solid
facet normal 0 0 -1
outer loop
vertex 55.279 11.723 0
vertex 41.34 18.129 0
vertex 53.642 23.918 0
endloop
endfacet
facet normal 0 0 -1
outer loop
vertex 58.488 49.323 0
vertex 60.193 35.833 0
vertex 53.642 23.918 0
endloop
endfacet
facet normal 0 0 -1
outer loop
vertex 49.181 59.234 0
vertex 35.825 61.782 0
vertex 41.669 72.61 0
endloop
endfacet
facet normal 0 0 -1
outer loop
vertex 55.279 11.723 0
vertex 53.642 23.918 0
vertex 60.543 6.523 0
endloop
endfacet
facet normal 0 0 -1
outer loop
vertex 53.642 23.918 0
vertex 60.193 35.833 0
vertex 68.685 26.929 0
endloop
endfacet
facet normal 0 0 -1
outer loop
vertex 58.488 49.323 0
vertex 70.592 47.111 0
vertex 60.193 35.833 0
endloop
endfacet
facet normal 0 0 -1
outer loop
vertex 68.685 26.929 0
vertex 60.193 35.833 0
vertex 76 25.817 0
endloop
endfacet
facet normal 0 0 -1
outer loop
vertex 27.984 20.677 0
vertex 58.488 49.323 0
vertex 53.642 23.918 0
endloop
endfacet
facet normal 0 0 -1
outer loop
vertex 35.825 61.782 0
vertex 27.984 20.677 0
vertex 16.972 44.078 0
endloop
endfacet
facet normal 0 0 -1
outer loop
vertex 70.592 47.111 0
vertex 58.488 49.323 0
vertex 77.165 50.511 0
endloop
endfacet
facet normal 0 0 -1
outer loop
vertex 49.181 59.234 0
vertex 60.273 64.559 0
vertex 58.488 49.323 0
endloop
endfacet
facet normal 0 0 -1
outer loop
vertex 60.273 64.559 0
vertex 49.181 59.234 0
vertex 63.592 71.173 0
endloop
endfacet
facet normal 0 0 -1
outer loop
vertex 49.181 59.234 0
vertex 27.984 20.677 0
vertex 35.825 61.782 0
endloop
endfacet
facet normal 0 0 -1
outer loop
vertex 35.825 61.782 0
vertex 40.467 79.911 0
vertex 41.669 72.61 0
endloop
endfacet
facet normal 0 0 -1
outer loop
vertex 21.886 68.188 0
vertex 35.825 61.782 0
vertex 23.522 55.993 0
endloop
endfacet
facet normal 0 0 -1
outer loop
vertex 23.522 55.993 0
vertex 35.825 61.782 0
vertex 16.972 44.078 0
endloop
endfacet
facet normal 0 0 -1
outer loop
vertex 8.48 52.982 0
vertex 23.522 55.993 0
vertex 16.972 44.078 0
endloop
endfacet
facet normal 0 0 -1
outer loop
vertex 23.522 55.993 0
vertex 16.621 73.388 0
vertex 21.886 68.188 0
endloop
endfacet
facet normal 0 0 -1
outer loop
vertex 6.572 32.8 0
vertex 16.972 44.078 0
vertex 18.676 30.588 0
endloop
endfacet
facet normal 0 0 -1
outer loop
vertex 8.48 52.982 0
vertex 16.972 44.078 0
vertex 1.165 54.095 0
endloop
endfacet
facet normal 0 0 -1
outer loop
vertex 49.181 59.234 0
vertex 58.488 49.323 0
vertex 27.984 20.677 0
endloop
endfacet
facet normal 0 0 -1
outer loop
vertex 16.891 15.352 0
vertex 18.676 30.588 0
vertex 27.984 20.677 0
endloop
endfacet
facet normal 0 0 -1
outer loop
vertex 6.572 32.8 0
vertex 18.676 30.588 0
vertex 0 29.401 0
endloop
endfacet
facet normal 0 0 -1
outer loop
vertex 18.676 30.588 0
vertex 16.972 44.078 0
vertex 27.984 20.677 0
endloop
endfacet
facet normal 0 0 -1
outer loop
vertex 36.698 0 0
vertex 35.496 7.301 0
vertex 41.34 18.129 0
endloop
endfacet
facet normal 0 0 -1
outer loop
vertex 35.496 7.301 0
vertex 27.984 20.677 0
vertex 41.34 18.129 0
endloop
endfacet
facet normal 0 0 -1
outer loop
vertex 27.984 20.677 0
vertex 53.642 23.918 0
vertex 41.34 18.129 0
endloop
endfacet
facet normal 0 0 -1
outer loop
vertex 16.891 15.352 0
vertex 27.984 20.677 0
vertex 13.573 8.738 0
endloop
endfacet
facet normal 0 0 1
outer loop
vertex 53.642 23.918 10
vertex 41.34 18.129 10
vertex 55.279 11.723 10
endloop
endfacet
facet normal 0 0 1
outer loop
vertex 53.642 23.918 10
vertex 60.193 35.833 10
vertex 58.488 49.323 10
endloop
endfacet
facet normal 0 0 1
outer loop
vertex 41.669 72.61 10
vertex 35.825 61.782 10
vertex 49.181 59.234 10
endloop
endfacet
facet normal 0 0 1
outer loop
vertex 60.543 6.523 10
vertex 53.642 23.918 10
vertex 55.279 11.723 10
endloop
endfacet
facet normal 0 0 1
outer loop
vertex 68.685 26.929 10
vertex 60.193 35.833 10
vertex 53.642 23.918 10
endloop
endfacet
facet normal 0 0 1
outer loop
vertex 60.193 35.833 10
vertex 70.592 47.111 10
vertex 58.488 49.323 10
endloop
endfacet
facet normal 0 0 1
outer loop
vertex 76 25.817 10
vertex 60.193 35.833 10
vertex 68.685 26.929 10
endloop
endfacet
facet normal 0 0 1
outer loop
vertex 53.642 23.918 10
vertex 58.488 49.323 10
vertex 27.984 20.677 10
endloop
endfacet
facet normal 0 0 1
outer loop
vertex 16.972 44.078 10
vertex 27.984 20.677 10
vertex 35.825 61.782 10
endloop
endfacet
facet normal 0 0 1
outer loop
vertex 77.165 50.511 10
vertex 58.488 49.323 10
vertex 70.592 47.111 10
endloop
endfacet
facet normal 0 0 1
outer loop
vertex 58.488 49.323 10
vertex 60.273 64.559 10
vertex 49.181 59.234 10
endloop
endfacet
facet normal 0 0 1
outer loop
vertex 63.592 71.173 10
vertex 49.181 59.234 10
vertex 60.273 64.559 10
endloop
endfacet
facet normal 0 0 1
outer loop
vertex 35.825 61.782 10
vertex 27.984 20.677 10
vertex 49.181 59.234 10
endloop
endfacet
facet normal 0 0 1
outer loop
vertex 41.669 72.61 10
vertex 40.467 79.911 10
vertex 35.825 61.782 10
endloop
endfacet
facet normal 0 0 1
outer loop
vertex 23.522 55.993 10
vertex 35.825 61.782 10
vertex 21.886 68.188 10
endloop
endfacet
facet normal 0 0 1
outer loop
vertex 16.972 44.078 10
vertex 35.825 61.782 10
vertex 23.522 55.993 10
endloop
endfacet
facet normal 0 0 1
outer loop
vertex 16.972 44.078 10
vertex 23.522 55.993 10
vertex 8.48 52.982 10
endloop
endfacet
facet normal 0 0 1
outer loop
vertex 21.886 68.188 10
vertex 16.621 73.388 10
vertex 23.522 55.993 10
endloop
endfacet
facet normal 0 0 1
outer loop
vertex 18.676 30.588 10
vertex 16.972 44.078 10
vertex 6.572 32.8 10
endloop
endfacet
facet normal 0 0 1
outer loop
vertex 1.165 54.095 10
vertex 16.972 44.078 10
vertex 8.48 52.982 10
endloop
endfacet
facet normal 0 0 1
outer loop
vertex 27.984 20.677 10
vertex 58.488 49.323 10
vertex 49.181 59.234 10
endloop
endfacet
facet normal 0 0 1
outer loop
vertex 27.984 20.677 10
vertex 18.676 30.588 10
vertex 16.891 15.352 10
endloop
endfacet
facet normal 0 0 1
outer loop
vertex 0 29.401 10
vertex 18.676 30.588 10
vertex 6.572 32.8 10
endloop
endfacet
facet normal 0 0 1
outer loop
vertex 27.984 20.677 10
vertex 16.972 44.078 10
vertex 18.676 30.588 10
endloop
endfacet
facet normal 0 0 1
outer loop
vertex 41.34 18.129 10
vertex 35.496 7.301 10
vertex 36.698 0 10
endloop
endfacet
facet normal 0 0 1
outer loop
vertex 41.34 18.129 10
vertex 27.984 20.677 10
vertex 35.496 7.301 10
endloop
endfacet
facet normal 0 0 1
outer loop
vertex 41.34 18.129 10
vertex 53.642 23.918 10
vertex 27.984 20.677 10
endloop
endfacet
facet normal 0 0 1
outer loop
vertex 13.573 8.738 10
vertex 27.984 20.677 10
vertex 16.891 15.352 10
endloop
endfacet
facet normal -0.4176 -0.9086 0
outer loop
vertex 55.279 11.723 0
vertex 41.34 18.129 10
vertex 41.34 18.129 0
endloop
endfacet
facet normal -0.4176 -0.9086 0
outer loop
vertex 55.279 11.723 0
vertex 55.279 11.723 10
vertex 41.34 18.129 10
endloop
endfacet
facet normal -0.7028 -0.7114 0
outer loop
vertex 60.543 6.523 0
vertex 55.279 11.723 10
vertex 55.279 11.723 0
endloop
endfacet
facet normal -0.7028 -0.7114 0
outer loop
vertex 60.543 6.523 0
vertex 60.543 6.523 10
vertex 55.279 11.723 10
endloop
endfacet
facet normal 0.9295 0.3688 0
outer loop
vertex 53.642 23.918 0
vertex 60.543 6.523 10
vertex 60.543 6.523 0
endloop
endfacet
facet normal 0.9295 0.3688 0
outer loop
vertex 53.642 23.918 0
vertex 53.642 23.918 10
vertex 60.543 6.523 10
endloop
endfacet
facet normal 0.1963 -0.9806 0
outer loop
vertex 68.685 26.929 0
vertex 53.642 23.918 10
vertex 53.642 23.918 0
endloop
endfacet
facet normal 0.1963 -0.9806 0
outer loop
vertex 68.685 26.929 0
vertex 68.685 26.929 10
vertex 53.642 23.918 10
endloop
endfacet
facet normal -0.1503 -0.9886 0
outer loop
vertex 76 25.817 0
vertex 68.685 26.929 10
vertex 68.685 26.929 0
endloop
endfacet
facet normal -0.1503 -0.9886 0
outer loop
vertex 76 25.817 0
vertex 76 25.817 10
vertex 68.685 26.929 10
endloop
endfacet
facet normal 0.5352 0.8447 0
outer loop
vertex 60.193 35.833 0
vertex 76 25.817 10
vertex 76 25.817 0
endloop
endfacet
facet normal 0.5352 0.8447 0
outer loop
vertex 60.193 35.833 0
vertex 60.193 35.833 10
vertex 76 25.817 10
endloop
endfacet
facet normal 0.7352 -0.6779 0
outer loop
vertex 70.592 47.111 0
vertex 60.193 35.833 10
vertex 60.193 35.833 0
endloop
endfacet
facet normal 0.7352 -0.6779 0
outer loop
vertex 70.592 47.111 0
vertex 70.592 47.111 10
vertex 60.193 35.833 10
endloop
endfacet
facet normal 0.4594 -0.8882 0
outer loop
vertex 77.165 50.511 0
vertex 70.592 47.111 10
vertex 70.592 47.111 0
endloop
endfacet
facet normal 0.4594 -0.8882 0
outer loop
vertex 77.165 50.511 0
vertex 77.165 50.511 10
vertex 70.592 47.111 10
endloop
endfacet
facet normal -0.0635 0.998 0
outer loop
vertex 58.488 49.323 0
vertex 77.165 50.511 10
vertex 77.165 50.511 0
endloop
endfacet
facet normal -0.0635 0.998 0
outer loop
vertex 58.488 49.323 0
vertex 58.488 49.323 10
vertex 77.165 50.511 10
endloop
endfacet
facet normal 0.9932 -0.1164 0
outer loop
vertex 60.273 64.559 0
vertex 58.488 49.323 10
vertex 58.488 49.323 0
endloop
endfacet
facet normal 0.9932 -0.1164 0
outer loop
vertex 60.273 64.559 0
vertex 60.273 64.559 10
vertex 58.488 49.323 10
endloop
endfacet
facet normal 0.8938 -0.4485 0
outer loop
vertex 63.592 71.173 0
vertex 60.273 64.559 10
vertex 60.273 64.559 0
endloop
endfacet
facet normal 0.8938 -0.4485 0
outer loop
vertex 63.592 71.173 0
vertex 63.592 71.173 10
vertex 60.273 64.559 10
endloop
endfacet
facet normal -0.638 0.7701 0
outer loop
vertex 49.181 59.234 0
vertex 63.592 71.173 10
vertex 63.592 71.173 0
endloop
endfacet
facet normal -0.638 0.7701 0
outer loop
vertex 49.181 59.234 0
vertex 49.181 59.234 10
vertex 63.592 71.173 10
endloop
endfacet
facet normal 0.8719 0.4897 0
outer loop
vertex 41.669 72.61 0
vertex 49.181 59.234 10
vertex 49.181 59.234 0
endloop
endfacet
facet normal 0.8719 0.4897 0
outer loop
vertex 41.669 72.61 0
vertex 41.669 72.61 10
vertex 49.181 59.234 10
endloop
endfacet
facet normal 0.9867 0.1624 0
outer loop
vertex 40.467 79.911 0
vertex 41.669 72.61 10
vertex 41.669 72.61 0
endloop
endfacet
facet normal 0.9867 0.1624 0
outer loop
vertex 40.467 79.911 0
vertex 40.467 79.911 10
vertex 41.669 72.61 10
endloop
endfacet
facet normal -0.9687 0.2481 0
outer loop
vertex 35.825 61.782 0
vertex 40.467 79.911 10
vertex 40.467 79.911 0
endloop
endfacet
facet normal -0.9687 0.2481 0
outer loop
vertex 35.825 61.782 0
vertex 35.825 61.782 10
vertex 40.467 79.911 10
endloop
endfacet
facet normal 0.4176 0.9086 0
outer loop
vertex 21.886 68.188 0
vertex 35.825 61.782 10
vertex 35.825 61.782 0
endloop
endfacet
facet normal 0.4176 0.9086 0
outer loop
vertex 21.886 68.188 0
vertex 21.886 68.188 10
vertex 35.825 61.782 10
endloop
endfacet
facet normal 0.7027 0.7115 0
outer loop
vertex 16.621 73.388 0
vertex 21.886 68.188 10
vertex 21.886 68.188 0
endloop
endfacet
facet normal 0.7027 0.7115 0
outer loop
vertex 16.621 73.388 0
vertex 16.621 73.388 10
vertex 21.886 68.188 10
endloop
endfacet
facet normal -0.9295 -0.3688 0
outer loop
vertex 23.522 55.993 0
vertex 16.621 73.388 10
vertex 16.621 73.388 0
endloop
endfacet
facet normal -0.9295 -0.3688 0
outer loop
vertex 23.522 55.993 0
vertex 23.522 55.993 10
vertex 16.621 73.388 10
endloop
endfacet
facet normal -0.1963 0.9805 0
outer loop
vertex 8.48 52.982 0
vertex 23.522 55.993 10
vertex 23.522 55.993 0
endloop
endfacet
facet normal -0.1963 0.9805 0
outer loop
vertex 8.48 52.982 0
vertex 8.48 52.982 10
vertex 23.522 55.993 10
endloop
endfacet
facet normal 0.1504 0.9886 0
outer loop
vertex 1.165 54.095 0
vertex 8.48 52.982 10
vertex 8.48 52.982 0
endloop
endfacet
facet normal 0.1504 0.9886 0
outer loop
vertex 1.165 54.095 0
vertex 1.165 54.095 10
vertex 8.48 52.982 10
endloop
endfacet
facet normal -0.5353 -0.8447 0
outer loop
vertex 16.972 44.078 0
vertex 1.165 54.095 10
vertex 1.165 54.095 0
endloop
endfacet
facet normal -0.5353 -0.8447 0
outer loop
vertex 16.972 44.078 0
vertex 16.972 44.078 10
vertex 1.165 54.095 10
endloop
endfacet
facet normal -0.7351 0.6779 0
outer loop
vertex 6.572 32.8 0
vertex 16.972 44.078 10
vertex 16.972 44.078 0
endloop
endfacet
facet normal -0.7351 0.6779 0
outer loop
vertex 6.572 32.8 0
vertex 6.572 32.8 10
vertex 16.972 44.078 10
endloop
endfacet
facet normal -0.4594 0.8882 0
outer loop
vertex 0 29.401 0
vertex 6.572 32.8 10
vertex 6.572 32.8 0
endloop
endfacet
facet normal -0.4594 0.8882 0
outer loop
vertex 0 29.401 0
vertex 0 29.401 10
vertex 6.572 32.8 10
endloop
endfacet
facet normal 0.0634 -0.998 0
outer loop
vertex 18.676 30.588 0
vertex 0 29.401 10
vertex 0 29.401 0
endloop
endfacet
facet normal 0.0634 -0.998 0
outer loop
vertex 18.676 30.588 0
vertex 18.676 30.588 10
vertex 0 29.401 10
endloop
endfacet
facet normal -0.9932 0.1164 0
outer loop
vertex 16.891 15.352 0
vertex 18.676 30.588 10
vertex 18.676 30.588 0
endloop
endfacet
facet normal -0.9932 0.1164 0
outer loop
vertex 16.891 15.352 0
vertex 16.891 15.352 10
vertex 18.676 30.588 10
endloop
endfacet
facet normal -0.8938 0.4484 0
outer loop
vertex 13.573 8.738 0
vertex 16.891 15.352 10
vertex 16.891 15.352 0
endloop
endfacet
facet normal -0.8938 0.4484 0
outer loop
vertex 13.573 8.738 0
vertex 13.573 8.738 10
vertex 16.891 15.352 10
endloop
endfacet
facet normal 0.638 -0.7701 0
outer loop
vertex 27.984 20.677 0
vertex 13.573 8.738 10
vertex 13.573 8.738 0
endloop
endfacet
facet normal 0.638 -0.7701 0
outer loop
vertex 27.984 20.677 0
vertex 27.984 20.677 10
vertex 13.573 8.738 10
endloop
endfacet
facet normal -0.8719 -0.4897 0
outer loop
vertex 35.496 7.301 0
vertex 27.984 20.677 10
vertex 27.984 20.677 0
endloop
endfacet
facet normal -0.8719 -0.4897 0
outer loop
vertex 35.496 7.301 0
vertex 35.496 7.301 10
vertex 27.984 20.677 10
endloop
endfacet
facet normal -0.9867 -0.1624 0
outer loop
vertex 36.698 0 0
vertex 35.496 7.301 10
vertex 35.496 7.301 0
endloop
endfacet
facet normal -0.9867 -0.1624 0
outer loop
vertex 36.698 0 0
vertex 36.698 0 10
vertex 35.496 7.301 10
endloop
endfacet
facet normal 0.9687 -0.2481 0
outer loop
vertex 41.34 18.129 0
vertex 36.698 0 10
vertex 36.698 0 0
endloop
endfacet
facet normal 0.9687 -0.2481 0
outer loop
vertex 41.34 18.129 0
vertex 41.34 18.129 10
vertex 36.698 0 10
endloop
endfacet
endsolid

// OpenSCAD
$fn = 32;

// ----------------------------------------------------------------------
// Fan rotor section: 10 blades, 22 mm hub radius, 18 mm blades
// ----------------------------------------------------------------------

// --- parameters (mm) ---
profile_height = 10;      // extrusion height
profile_points = 30;      // points of the closed outline

profile = [[60.193, 35.833], [70.592, 47.111], [77.165, 50.511], [58.488, 49.323], [60.273, 64.559], [63.592, 71.173], [49.181, 59.234], [41.669, 72.61], [40.467, 79.911], [35.825, 61.782], [21.886, 68.188], [16.621, 73.388], [23.522, 55.993], [8.48, 52.982], [1.165, 54.095], [16.972, 44.078], [6.572, 32.8], [0, 29.401], [18.676, 30.588], [16.891, 15.352], [13.573, 8.738], [27.984, 20.677], [35.496, 7.301], [36.698, 0], [41.34, 18.129], [55.279, 11.723], [60.543, 6.523], [53.642, 23.918], [68.685, 26.929], [76, 25.817]];  // single closed polygon, 30 points, counter clockwise

// --- the one profile operation ---
linear_extrude(height = profile_height) polygon(points = profile);
